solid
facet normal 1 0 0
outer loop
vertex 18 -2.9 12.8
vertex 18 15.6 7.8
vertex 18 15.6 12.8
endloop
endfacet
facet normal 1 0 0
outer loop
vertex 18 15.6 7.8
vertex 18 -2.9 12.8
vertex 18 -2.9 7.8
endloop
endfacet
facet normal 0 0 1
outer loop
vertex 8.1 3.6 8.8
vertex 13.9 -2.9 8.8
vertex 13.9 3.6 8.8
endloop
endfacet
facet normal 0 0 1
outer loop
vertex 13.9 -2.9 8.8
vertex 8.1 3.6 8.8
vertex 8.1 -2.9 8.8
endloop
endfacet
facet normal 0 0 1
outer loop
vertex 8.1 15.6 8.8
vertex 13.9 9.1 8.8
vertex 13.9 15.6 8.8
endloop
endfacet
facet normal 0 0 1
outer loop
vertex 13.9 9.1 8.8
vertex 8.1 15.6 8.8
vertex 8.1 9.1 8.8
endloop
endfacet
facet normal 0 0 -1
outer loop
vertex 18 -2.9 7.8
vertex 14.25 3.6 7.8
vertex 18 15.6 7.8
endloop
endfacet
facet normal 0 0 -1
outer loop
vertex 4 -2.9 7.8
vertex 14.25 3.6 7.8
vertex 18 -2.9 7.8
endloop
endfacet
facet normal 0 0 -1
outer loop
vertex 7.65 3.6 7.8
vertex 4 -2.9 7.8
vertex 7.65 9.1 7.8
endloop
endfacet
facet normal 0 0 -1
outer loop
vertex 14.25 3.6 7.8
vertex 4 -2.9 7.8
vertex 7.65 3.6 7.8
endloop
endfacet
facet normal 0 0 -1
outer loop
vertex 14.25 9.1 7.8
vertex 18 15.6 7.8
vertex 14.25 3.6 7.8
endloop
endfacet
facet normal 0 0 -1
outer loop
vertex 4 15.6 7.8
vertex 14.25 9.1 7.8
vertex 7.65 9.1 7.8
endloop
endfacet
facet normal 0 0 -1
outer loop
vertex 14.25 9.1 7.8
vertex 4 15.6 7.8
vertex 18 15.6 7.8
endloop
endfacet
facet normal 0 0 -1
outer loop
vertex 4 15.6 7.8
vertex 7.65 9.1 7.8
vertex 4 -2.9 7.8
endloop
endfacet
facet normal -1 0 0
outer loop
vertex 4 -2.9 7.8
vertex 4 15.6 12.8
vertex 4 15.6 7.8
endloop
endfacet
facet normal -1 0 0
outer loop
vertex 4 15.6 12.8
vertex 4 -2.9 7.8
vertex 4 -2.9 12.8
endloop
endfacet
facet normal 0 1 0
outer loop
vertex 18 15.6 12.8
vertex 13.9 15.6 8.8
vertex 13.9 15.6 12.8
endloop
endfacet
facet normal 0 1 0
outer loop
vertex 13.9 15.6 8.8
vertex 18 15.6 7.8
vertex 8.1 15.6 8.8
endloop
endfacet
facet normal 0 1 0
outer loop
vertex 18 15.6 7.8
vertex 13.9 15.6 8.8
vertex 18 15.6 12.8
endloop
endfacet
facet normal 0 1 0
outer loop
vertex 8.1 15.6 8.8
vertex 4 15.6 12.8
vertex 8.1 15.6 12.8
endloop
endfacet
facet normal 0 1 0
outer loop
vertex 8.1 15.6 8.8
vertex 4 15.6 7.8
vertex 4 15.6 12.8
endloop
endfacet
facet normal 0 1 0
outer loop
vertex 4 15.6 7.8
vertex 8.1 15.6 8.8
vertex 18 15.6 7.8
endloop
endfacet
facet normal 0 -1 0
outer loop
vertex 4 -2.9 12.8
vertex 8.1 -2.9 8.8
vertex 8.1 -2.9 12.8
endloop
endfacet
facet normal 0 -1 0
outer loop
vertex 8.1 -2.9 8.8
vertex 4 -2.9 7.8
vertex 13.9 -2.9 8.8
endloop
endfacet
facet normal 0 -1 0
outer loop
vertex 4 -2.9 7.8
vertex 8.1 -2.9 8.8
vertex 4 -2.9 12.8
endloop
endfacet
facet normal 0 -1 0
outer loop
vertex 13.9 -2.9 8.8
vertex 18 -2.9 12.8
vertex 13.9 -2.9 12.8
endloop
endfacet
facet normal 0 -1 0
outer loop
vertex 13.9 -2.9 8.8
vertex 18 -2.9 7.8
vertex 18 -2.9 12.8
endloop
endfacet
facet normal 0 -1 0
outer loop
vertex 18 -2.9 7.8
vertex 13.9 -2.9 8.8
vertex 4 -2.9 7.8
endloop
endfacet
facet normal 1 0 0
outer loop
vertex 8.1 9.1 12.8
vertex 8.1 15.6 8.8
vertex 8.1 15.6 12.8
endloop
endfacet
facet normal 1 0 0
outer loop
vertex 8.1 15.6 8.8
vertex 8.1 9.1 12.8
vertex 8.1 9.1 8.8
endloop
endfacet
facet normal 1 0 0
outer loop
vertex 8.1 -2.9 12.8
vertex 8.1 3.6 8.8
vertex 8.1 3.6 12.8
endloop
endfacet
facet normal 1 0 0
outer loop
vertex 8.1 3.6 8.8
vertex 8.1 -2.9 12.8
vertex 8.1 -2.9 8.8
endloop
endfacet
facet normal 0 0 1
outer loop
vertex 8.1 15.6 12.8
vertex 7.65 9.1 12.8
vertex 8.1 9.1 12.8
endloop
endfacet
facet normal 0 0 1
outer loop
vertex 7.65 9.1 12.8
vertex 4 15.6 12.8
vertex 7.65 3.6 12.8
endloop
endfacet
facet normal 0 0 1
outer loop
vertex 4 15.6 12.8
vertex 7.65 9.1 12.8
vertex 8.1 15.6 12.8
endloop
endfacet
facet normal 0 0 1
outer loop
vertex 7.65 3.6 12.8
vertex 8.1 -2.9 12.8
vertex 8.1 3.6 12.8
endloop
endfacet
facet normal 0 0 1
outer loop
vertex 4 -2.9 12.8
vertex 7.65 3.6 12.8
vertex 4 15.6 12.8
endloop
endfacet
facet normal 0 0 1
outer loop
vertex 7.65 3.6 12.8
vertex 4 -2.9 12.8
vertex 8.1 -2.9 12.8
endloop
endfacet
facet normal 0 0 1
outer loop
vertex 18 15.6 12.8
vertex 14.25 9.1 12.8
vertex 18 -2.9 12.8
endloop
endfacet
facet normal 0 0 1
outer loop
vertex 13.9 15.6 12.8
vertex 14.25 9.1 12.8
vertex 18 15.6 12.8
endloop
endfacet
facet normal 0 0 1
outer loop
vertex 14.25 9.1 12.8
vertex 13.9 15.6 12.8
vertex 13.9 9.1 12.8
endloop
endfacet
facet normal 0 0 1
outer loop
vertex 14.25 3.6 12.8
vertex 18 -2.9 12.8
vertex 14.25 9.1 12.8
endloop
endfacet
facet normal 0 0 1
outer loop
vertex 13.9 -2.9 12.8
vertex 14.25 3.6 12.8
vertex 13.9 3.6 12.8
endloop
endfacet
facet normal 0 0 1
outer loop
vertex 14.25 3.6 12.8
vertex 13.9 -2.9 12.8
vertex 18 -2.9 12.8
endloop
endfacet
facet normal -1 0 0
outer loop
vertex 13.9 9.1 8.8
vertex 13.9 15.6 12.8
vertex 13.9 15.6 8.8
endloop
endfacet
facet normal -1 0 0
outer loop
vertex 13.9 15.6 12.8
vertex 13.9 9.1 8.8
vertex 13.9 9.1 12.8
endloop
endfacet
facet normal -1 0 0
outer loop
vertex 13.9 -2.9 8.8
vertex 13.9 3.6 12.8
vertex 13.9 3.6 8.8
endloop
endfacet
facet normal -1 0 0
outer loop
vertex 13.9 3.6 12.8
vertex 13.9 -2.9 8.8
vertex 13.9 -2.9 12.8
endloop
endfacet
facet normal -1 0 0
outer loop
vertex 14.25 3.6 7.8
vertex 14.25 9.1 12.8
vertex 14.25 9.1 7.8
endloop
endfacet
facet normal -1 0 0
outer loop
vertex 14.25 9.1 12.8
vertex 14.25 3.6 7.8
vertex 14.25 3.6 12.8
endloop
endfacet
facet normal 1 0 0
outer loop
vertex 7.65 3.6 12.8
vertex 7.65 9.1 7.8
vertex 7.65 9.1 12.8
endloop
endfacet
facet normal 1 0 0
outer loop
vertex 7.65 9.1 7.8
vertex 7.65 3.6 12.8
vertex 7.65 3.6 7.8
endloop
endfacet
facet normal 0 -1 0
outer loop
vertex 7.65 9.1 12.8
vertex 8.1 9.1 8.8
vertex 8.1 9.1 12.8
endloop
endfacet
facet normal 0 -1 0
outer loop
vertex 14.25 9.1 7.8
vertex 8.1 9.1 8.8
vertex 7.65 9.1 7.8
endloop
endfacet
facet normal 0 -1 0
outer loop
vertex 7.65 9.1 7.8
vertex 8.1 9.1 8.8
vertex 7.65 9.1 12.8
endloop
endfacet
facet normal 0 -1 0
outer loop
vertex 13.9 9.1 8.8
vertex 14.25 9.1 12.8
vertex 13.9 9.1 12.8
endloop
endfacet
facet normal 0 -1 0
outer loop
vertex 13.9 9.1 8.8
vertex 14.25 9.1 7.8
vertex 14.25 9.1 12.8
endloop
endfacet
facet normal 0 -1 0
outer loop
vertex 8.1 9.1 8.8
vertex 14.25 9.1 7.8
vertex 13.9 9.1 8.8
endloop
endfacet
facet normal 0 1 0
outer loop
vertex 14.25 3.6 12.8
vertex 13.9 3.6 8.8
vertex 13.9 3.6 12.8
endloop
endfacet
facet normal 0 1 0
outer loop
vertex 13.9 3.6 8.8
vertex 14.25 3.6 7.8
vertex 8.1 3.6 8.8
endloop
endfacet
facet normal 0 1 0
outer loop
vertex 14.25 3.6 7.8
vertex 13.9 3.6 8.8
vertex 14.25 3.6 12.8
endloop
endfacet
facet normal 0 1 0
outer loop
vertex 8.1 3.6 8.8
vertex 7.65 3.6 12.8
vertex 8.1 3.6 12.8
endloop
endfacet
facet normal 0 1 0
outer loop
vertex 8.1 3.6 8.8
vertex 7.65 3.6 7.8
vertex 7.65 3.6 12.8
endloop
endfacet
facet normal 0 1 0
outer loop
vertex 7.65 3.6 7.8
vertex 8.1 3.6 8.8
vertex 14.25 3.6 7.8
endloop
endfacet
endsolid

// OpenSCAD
/* slide actuator */
union() {
    translate([2,-0.9,7.8]) {
        difference() {
            union() {
                translate([2,-2,0]) {
                    cube([14,18.5,1]);
                }
                translate([2.0,-2,1]) {
                    cube([4.1,18.5,4]);
                }
                translate([11.9,-2,1]) {
                    cube([4.1,18.5,4]);
                }
            }
            translate([5.65,4.5,-1]) {
                cube([6.6,5.5,6.2]);
            }
        }
    }
}
